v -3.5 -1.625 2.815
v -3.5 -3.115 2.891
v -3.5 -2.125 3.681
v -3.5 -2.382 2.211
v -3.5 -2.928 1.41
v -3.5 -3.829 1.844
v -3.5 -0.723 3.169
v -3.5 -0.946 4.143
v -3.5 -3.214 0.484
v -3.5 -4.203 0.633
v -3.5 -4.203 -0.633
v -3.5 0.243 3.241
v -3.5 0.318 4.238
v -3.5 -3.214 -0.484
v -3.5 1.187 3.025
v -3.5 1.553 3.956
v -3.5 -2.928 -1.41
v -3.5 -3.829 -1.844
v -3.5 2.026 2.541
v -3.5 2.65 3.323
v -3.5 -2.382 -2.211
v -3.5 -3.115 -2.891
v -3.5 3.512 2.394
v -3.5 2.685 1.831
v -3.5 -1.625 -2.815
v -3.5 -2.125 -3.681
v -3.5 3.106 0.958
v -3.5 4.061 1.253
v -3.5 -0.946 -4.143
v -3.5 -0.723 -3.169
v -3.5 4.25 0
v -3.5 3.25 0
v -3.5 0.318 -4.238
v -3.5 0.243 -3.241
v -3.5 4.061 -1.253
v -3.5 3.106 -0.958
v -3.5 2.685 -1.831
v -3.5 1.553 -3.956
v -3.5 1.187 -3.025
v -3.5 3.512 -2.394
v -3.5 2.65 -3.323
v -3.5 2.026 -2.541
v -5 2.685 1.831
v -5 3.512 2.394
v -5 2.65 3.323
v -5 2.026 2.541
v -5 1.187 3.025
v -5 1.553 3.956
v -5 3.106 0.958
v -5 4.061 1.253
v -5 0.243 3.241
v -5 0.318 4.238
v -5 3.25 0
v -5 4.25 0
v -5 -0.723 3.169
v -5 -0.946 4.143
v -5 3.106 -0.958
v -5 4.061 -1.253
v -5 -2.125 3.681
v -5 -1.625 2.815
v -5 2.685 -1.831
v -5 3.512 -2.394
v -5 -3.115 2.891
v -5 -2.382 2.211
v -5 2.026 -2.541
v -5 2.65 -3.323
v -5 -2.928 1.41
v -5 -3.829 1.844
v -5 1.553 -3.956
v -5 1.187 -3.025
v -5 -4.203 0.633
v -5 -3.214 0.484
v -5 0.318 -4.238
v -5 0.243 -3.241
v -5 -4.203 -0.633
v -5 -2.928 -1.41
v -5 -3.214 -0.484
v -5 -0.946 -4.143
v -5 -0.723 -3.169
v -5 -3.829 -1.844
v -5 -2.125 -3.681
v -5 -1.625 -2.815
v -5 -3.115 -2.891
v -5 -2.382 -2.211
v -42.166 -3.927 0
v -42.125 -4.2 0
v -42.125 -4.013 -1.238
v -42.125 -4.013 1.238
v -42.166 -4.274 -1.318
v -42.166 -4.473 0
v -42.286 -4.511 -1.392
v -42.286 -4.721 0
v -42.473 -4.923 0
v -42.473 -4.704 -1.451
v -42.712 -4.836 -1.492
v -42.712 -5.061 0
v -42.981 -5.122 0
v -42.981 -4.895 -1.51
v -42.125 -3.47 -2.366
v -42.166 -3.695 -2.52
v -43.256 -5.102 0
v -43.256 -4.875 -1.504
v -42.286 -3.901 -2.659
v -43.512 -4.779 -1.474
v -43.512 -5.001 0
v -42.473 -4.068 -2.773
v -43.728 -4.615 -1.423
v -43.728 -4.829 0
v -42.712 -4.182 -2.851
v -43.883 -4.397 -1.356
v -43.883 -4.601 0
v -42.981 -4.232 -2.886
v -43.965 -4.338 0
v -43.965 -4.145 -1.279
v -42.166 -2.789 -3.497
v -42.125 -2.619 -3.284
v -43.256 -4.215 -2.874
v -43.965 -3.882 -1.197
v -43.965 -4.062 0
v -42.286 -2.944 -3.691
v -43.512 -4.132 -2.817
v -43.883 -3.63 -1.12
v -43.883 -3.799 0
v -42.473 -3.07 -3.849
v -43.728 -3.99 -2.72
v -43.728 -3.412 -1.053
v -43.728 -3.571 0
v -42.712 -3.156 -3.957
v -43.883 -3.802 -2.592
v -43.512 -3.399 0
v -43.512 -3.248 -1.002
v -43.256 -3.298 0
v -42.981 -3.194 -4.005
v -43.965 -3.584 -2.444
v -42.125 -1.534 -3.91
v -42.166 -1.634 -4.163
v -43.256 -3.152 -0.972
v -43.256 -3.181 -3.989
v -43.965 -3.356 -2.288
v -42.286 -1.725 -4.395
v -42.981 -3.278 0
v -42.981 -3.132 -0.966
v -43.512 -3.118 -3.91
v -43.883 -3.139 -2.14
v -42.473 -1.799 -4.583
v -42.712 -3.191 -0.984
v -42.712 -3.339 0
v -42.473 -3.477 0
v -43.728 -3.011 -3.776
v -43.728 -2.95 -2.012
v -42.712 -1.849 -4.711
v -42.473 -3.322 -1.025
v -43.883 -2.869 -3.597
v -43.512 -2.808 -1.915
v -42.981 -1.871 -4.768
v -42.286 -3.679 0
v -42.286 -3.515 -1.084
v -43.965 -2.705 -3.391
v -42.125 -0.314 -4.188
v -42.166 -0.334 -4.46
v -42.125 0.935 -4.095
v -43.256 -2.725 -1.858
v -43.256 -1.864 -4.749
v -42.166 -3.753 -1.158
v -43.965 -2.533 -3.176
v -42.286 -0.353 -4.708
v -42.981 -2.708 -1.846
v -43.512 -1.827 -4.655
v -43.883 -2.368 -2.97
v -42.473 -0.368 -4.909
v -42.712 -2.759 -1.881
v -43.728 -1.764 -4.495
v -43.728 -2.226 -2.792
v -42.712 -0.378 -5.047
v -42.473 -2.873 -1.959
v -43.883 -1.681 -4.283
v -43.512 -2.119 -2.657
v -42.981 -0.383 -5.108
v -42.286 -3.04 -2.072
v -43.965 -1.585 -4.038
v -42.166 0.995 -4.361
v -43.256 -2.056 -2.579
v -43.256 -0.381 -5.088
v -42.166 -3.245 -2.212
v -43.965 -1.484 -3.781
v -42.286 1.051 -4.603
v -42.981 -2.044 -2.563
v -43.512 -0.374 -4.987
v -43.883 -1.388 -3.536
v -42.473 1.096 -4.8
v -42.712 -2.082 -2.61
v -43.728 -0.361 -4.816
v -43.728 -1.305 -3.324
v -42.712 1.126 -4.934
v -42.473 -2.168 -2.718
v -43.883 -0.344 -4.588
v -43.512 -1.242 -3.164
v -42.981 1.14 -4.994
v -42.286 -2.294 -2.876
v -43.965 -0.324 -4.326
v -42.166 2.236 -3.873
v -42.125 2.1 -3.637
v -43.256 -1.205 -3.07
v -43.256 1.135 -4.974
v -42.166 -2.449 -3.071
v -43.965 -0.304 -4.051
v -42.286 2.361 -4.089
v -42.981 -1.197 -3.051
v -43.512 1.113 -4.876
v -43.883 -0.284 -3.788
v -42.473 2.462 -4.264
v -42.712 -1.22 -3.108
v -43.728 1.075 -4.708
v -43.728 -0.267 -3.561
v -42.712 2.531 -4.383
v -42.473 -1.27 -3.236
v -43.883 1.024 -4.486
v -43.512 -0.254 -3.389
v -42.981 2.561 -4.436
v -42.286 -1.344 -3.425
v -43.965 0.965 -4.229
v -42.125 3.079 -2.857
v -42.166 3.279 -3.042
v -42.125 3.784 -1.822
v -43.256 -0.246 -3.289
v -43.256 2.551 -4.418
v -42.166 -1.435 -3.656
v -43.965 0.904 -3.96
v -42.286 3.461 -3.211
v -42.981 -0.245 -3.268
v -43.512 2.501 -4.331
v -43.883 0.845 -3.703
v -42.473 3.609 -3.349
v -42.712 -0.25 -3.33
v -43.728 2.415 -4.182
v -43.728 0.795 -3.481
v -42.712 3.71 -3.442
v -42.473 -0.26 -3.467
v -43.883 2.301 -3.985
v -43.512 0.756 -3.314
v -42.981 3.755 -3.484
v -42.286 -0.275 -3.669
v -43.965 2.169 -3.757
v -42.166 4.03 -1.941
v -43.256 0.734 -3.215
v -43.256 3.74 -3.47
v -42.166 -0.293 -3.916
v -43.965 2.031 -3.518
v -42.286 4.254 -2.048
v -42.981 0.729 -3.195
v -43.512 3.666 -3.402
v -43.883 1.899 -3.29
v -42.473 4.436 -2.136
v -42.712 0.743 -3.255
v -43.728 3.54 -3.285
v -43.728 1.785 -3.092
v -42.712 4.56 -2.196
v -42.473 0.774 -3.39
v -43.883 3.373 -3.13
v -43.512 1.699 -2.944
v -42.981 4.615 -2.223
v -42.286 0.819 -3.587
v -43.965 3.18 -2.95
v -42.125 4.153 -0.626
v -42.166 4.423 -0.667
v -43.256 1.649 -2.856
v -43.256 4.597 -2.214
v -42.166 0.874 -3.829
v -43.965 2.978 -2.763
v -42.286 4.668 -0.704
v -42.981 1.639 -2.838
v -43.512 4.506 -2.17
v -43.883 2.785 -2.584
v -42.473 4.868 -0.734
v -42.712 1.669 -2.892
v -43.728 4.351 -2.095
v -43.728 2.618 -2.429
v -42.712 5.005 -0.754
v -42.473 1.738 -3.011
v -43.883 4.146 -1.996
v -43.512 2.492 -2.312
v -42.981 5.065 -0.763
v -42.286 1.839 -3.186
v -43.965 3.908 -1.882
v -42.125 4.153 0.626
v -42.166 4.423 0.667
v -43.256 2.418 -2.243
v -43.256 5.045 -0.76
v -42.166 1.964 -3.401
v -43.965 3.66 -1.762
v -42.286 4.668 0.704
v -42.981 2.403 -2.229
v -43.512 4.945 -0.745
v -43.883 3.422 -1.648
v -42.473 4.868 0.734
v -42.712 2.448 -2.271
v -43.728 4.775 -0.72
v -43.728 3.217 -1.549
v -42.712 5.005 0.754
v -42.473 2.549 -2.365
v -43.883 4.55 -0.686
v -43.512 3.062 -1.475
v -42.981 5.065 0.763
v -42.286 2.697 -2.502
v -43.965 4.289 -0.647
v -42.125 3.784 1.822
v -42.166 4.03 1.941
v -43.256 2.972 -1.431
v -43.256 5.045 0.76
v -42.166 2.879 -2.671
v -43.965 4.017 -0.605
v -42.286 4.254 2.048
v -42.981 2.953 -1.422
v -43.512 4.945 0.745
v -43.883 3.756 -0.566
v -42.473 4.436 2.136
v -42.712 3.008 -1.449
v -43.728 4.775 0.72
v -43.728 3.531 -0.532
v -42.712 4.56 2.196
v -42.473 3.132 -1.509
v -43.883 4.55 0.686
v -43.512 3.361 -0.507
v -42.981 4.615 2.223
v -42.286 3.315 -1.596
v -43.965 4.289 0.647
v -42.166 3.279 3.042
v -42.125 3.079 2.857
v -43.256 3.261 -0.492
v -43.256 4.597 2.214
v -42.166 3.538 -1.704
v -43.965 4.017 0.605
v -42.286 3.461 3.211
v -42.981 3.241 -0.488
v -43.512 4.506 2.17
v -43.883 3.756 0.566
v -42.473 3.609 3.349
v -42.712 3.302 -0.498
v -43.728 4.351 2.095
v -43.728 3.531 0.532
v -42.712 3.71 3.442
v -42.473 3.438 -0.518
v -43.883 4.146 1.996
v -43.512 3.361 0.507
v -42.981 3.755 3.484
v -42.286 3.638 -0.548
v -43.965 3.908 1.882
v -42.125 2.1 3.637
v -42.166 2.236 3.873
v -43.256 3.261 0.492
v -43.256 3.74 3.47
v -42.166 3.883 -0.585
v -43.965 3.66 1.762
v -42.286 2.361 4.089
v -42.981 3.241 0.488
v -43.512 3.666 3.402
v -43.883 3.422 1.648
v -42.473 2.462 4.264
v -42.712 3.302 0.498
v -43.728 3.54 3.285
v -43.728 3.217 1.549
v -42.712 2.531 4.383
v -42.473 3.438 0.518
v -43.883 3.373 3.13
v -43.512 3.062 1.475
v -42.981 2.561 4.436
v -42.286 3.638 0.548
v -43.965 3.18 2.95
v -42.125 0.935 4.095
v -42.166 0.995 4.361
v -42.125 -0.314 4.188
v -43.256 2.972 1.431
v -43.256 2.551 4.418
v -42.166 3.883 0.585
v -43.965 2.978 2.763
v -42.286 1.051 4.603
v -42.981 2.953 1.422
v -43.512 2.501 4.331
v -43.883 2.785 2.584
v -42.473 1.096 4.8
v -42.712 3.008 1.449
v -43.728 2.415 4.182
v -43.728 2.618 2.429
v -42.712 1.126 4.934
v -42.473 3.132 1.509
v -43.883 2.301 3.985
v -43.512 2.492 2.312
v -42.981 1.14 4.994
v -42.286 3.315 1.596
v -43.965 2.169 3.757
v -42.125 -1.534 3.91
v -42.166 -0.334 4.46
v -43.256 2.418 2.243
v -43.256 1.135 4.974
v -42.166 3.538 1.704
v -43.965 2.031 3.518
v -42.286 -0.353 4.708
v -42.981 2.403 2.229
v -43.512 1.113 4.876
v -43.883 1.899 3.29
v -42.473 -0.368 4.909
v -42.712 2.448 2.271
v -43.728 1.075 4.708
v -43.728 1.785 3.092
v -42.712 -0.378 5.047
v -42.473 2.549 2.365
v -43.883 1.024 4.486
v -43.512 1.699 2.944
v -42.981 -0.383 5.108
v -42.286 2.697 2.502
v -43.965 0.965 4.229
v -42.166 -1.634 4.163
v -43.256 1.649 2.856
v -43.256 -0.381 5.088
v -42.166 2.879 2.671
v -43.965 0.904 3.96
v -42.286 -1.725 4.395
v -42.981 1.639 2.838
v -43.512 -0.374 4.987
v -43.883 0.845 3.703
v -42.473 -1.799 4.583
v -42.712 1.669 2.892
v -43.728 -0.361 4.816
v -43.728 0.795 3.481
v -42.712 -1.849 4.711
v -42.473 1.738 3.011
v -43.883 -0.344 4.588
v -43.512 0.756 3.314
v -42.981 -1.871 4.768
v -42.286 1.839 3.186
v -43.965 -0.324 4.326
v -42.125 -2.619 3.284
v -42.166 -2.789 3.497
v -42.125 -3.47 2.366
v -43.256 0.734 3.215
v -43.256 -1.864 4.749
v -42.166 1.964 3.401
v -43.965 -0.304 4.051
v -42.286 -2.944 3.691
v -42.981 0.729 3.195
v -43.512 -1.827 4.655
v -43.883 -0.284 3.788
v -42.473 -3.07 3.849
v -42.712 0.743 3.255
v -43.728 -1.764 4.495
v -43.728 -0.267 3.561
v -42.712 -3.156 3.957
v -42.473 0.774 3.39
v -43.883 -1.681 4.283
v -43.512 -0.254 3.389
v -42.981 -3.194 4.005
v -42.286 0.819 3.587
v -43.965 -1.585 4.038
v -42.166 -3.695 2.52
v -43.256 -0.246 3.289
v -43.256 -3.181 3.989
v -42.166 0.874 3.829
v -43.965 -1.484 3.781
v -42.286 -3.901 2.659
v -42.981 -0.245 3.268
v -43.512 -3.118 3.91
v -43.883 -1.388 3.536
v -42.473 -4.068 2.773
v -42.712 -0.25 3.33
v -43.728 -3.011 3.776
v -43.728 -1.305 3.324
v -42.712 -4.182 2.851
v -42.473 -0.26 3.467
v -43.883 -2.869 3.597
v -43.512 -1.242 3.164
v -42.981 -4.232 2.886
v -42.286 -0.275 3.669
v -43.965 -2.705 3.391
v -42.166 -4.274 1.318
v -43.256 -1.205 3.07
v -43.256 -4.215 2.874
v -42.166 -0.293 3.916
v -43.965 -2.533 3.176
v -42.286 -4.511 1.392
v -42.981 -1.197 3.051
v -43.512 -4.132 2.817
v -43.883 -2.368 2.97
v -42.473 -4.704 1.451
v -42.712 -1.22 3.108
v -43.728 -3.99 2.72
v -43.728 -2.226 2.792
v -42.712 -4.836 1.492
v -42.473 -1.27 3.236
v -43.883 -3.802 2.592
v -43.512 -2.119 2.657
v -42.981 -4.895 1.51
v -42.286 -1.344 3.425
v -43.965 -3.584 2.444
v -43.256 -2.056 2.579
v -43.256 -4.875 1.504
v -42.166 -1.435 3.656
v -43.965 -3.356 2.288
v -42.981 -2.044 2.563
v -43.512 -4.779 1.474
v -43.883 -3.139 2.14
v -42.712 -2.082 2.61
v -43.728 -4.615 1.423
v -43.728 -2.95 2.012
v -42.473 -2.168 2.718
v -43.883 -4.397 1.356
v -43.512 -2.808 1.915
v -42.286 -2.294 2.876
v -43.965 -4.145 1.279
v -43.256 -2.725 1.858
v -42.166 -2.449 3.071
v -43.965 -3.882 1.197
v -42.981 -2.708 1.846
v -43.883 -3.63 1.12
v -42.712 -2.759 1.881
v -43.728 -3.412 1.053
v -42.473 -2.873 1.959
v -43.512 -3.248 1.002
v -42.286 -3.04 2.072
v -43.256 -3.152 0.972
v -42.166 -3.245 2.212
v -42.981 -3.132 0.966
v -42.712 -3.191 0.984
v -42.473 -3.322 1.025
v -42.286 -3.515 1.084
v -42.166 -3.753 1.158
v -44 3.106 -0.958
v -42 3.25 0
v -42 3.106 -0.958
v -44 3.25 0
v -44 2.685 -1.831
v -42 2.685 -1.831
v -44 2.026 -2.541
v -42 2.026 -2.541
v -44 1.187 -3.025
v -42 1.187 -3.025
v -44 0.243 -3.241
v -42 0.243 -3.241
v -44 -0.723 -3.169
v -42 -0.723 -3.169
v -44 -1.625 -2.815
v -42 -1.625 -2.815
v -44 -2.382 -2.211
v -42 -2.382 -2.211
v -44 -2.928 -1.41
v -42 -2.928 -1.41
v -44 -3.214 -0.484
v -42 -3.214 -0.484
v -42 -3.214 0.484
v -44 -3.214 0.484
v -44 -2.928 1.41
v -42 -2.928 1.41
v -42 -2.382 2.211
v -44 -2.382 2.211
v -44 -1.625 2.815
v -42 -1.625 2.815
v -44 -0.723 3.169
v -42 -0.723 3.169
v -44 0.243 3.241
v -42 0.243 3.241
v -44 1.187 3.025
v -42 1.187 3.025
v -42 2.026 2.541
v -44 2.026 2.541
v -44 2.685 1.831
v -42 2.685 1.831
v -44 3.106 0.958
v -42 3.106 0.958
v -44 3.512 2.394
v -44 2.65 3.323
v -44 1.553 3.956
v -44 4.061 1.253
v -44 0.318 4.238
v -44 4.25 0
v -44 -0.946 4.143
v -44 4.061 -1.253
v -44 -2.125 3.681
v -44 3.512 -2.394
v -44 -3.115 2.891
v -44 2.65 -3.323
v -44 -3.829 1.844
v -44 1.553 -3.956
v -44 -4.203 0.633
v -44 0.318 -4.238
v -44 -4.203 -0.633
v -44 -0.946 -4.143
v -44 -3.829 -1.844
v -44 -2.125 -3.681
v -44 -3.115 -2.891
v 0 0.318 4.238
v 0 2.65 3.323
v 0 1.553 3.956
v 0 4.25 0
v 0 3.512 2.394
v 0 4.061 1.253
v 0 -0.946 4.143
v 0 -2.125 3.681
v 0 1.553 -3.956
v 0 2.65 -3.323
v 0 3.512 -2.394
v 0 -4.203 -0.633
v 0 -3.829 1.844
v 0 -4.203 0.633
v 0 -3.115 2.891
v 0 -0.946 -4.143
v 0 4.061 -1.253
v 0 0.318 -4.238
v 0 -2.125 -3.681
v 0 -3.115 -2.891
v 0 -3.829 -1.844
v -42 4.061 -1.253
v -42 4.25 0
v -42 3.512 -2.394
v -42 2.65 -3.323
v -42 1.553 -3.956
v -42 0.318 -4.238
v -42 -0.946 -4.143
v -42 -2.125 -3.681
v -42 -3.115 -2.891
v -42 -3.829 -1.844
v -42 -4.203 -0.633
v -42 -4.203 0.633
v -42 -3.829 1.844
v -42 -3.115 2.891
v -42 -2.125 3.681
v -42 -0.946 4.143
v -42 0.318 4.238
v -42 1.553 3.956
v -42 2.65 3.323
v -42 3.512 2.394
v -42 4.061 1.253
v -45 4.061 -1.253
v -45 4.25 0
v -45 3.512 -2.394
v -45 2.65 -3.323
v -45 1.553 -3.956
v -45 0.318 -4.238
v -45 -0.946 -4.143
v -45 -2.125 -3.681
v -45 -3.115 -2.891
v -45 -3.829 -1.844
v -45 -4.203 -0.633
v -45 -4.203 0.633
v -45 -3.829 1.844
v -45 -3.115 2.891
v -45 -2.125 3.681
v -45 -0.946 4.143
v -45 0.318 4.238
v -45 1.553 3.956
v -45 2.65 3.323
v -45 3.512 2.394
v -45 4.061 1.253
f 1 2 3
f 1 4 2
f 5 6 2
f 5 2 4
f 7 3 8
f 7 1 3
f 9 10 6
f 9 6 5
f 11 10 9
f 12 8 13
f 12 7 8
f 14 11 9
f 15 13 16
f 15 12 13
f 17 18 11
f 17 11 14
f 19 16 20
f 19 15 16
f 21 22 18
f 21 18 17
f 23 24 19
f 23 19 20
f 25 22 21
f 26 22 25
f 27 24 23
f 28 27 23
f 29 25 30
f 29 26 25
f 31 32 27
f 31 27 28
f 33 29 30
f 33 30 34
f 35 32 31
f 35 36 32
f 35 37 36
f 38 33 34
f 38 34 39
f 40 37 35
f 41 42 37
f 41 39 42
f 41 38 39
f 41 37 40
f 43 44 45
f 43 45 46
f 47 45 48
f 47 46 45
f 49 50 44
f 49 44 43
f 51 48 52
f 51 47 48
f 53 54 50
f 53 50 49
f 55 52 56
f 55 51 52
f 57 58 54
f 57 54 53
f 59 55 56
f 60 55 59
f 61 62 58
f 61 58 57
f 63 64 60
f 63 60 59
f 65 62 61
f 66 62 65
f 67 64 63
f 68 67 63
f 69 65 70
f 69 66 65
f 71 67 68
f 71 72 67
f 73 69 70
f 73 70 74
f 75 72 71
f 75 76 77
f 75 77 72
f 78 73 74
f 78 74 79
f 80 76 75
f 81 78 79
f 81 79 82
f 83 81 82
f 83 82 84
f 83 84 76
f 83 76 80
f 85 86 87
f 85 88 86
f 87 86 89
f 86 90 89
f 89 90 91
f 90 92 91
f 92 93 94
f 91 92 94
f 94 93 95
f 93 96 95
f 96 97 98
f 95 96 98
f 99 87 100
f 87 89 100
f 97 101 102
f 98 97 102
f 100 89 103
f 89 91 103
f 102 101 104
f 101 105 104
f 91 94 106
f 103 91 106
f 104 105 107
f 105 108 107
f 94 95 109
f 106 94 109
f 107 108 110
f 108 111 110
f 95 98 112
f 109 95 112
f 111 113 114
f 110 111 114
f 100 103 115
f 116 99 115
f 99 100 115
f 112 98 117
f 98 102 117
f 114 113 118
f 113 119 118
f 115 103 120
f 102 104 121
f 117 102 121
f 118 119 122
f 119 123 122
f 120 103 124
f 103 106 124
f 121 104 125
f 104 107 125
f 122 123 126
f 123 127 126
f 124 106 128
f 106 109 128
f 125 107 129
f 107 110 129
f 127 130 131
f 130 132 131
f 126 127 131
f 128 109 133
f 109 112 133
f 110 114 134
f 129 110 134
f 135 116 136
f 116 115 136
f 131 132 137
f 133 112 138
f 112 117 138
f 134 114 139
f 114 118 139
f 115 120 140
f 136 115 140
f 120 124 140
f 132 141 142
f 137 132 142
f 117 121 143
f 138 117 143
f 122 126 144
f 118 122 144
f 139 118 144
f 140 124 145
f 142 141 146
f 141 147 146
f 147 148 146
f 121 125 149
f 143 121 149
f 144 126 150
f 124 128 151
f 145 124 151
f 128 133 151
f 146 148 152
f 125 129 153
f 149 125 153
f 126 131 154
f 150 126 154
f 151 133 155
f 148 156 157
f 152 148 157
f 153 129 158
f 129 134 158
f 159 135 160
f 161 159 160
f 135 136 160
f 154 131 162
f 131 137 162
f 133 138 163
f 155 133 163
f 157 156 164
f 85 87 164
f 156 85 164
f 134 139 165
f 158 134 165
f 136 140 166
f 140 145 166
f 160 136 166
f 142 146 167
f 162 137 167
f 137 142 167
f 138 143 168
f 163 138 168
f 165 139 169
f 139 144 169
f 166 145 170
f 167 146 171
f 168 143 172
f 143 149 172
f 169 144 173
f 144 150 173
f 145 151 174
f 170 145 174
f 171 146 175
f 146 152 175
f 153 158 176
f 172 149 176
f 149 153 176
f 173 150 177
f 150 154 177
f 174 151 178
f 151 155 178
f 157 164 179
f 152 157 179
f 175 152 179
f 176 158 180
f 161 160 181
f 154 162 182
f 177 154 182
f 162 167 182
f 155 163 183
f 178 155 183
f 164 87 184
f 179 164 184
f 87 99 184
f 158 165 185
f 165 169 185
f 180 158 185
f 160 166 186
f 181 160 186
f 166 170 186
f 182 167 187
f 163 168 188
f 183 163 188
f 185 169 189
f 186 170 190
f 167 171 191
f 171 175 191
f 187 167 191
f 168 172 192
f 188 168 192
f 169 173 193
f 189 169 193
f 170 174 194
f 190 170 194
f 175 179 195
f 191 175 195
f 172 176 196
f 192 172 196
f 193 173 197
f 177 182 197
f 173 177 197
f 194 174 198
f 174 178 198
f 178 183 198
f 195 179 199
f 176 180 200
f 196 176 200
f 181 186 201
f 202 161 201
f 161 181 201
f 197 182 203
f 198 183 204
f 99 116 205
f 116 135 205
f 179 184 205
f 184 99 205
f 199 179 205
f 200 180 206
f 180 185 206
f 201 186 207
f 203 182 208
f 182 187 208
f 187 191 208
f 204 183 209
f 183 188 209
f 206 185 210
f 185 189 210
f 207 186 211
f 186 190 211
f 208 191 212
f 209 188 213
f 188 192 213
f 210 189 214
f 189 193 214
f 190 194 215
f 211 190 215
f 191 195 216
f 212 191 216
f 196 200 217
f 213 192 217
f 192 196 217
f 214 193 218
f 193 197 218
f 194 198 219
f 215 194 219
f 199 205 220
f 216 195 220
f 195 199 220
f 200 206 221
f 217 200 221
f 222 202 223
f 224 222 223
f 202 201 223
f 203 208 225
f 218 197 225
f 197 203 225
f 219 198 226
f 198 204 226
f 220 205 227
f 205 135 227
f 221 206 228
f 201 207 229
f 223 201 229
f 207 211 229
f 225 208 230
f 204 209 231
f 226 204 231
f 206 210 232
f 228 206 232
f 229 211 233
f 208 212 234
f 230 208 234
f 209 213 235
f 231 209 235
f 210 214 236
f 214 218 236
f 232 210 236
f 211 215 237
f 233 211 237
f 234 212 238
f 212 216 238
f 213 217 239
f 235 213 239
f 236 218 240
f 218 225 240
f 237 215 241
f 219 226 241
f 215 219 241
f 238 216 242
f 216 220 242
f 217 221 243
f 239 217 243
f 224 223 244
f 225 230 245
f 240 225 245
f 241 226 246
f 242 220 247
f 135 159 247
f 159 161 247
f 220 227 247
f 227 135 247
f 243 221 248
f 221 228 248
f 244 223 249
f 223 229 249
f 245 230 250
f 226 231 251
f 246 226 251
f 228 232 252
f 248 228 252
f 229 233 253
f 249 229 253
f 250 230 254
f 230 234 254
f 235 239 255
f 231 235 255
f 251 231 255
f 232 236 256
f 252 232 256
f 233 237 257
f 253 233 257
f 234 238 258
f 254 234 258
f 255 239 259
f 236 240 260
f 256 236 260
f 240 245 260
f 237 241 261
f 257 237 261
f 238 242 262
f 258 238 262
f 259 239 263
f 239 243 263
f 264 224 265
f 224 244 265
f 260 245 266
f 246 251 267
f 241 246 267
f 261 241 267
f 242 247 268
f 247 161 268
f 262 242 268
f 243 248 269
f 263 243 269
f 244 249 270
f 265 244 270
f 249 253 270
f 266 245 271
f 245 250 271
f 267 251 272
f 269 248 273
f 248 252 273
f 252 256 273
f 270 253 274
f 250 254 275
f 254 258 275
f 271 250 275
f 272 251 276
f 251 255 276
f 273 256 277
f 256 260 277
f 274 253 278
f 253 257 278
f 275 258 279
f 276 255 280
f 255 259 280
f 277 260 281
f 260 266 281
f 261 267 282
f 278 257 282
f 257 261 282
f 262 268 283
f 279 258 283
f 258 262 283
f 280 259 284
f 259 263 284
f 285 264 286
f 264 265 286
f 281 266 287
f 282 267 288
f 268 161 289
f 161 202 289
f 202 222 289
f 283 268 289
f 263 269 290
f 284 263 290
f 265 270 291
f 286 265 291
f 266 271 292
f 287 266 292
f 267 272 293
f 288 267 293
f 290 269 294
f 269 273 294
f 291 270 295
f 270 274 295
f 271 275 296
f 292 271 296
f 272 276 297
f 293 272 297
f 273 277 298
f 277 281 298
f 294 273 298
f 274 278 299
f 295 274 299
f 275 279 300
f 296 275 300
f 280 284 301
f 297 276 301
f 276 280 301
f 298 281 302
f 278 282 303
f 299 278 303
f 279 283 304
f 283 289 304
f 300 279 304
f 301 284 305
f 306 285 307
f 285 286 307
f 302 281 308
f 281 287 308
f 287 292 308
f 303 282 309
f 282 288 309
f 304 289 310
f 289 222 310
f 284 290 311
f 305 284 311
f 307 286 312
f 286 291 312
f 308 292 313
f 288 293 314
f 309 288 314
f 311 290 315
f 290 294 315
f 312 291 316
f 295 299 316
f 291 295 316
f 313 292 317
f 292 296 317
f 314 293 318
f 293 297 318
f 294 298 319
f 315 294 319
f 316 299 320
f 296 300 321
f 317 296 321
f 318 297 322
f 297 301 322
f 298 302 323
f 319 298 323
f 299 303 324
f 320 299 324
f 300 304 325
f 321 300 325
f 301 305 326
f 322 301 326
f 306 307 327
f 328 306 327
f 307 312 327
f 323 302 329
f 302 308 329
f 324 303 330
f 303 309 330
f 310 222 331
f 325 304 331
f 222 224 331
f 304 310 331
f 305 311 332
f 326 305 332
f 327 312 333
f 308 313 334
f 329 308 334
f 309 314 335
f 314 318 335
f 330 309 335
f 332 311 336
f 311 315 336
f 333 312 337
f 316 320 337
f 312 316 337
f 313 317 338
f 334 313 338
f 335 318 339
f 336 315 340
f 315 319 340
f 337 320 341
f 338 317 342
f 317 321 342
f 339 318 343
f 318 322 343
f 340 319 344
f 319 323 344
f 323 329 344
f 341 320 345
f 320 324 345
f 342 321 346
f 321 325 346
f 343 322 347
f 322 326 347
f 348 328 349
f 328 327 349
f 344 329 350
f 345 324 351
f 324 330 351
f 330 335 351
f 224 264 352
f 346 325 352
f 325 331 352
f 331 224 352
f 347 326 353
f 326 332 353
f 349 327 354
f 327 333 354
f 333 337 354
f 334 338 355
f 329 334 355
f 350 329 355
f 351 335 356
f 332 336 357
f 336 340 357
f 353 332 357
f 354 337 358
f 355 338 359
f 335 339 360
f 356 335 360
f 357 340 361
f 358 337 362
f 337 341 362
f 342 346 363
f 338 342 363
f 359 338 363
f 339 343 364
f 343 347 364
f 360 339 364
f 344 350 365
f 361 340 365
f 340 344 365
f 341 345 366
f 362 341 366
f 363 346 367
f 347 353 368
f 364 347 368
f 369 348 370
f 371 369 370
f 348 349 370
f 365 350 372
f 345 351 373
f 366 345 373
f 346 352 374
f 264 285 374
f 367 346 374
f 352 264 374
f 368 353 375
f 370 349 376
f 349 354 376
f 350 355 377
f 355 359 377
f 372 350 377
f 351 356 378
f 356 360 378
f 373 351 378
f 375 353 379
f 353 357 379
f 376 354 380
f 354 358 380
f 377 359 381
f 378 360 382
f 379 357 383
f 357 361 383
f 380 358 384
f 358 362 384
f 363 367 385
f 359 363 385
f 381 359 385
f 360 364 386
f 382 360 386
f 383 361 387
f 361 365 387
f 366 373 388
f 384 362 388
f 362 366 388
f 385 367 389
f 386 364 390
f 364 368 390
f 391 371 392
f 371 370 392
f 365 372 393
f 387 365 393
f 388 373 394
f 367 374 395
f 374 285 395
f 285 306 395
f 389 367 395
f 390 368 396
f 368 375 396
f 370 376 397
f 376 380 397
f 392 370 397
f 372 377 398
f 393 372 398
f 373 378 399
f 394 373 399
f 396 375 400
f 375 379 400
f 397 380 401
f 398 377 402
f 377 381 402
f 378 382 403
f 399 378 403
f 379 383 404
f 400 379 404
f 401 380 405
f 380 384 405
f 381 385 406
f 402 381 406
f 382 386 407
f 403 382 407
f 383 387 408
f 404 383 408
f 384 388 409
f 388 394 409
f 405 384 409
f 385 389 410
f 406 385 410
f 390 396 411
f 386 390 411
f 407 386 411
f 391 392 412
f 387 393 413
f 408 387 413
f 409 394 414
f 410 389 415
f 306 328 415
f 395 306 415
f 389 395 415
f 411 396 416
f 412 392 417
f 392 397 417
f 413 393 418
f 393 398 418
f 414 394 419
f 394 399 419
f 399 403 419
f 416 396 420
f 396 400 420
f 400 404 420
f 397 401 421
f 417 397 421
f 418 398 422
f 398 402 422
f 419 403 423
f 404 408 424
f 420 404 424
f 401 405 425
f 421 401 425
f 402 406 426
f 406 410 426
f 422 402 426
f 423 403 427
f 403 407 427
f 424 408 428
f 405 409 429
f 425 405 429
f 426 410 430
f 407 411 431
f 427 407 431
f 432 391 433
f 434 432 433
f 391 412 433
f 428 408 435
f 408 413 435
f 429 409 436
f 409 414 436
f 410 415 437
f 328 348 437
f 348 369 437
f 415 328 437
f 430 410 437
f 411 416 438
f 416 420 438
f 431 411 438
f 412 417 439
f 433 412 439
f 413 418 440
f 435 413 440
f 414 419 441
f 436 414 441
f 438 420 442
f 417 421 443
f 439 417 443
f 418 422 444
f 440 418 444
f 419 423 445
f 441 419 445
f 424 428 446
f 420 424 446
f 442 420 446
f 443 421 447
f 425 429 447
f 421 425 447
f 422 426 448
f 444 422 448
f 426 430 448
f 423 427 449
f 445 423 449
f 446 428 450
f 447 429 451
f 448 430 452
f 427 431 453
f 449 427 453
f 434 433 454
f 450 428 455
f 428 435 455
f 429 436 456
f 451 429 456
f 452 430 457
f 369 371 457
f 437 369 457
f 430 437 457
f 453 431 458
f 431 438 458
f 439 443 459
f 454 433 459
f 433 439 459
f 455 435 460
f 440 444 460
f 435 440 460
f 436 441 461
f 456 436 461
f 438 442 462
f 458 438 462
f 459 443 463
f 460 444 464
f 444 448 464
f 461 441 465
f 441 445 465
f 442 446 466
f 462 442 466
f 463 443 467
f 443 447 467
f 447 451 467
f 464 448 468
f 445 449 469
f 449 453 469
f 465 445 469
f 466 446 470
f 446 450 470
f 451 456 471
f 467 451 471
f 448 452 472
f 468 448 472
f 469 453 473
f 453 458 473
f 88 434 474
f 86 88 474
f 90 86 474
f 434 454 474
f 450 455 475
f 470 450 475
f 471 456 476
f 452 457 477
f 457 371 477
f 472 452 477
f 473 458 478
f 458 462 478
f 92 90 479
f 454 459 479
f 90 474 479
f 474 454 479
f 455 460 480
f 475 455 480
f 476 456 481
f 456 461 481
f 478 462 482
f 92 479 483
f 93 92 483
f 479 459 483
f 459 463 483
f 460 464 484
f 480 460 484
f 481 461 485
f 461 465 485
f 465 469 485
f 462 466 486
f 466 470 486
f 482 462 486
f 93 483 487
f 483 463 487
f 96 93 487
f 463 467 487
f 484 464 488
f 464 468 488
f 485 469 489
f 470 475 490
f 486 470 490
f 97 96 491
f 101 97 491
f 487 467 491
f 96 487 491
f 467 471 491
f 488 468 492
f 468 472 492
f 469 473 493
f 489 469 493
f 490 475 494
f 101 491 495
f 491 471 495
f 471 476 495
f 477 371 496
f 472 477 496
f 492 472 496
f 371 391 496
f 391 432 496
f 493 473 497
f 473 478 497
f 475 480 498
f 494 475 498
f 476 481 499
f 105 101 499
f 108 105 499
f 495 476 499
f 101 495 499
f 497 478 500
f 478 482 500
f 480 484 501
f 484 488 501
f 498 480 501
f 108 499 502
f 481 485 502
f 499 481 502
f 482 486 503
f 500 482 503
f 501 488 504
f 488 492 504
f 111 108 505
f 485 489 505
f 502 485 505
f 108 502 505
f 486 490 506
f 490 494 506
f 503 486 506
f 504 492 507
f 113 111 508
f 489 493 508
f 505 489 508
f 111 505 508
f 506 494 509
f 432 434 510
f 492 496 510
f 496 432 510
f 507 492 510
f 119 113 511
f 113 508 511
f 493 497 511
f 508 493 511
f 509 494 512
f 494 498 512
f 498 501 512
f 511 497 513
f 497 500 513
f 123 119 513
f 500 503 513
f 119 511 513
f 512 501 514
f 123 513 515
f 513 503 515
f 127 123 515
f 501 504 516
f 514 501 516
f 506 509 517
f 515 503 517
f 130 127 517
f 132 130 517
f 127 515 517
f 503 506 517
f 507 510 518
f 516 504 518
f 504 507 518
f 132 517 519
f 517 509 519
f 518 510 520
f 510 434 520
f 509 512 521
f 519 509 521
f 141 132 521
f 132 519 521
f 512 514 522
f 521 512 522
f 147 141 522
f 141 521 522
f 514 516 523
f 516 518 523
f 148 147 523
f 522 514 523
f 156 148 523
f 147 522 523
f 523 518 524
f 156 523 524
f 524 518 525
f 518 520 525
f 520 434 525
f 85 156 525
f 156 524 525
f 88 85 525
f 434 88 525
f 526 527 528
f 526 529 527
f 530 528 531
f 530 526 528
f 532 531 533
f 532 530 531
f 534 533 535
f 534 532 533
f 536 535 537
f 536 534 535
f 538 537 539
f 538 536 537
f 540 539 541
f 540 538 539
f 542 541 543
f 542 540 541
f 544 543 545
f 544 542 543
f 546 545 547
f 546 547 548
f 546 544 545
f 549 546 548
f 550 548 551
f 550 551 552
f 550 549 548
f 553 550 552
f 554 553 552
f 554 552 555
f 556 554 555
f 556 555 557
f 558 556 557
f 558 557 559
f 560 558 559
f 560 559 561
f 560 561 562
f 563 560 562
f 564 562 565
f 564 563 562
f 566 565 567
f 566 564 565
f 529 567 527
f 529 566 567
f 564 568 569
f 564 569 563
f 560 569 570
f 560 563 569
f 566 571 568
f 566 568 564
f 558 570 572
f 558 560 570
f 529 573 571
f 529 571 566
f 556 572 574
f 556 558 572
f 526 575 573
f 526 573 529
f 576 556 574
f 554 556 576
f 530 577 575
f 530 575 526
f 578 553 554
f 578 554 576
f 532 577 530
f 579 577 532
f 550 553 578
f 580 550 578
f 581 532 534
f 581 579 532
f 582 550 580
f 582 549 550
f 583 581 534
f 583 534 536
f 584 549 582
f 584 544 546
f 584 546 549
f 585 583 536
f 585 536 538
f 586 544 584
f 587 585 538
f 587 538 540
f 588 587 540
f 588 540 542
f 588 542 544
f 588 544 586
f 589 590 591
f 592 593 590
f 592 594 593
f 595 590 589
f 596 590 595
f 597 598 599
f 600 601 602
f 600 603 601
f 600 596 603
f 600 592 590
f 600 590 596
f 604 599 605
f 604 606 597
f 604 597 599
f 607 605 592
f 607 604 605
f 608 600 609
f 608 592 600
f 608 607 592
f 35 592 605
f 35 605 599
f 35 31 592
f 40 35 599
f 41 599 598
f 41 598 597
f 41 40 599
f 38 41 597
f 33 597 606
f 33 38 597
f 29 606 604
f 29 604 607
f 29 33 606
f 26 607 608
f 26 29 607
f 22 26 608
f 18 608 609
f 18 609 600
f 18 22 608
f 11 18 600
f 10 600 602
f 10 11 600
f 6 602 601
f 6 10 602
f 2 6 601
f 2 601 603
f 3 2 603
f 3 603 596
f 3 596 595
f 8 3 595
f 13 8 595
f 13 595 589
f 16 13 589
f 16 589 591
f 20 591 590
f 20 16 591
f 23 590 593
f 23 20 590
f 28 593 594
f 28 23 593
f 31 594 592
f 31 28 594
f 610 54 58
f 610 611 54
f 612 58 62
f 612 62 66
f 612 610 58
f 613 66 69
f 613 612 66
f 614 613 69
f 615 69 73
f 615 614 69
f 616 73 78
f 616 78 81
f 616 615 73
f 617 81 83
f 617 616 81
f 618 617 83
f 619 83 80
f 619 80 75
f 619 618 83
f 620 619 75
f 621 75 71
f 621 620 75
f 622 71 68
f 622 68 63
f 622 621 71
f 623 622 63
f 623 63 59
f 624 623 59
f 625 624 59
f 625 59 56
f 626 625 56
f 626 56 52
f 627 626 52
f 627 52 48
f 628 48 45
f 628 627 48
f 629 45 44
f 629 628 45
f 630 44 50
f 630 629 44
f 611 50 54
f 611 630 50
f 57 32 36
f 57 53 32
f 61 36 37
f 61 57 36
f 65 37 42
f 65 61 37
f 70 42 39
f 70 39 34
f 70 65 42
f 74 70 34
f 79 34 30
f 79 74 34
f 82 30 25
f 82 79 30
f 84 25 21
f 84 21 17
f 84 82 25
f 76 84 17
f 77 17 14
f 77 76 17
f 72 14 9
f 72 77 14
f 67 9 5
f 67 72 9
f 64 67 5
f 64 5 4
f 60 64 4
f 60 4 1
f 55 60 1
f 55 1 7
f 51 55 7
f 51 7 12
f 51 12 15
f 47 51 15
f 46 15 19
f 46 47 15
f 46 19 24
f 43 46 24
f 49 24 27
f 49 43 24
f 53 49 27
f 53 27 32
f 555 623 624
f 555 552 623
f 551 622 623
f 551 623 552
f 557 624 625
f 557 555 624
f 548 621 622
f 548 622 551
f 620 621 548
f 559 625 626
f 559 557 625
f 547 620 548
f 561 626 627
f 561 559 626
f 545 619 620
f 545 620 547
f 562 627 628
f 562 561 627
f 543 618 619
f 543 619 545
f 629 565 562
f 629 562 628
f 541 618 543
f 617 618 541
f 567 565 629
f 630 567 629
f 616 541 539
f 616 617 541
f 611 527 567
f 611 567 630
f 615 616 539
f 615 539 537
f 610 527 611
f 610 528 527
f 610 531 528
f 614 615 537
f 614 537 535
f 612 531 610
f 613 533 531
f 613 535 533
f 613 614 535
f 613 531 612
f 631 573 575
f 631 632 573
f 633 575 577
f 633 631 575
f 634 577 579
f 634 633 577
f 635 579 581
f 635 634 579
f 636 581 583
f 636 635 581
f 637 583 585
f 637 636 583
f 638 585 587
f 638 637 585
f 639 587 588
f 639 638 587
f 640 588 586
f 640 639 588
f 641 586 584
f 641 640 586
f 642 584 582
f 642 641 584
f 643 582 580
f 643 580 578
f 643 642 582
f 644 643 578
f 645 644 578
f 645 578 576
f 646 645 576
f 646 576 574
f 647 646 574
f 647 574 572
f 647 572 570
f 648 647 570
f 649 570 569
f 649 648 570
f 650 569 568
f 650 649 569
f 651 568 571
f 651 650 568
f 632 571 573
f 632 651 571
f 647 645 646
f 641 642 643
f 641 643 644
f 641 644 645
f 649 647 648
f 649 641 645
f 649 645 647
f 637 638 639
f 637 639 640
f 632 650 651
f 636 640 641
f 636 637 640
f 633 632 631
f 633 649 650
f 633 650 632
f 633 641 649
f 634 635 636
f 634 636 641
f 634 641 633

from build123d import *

# Parameters (mm, degrees)
SKETCH2_R = 0.925


with BuildPart() as part:
    # Sketch1 → Revolve1 (revolve)
    with BuildSketch(Plane.XY):
        Polygon((-44, 4.25), (-45, 4.25), (-45, 0), (0, 0), (0, 4.25), (-3.5, 4.25), (-3.5, 3.25), (-5, 3.25), (-5, 4.25), (-42, 4.25), (-42, 3.25), (-44, 3.25), align=None)
    revolve(axis=Axis((0, 0, 0), (-1, 0, 0)))


with BuildPart() as body_2:
    # Sketch2 → Revolve2 (revolve)
    with BuildSketch(Plane.XY, mode=Mode.PRIVATE) as revolve2_sk:
        with Locations((-43.05, 4.2)):
            Circle(SKETCH2_R)
    revolve(revolve2_sk.sketch.rotate(Axis((0, 0, 0), (1, 0, 0)), 180), axis=Axis((0, 0, 0), (1, 0, 0)))


solid = Compound([part.part, body_2.part])
